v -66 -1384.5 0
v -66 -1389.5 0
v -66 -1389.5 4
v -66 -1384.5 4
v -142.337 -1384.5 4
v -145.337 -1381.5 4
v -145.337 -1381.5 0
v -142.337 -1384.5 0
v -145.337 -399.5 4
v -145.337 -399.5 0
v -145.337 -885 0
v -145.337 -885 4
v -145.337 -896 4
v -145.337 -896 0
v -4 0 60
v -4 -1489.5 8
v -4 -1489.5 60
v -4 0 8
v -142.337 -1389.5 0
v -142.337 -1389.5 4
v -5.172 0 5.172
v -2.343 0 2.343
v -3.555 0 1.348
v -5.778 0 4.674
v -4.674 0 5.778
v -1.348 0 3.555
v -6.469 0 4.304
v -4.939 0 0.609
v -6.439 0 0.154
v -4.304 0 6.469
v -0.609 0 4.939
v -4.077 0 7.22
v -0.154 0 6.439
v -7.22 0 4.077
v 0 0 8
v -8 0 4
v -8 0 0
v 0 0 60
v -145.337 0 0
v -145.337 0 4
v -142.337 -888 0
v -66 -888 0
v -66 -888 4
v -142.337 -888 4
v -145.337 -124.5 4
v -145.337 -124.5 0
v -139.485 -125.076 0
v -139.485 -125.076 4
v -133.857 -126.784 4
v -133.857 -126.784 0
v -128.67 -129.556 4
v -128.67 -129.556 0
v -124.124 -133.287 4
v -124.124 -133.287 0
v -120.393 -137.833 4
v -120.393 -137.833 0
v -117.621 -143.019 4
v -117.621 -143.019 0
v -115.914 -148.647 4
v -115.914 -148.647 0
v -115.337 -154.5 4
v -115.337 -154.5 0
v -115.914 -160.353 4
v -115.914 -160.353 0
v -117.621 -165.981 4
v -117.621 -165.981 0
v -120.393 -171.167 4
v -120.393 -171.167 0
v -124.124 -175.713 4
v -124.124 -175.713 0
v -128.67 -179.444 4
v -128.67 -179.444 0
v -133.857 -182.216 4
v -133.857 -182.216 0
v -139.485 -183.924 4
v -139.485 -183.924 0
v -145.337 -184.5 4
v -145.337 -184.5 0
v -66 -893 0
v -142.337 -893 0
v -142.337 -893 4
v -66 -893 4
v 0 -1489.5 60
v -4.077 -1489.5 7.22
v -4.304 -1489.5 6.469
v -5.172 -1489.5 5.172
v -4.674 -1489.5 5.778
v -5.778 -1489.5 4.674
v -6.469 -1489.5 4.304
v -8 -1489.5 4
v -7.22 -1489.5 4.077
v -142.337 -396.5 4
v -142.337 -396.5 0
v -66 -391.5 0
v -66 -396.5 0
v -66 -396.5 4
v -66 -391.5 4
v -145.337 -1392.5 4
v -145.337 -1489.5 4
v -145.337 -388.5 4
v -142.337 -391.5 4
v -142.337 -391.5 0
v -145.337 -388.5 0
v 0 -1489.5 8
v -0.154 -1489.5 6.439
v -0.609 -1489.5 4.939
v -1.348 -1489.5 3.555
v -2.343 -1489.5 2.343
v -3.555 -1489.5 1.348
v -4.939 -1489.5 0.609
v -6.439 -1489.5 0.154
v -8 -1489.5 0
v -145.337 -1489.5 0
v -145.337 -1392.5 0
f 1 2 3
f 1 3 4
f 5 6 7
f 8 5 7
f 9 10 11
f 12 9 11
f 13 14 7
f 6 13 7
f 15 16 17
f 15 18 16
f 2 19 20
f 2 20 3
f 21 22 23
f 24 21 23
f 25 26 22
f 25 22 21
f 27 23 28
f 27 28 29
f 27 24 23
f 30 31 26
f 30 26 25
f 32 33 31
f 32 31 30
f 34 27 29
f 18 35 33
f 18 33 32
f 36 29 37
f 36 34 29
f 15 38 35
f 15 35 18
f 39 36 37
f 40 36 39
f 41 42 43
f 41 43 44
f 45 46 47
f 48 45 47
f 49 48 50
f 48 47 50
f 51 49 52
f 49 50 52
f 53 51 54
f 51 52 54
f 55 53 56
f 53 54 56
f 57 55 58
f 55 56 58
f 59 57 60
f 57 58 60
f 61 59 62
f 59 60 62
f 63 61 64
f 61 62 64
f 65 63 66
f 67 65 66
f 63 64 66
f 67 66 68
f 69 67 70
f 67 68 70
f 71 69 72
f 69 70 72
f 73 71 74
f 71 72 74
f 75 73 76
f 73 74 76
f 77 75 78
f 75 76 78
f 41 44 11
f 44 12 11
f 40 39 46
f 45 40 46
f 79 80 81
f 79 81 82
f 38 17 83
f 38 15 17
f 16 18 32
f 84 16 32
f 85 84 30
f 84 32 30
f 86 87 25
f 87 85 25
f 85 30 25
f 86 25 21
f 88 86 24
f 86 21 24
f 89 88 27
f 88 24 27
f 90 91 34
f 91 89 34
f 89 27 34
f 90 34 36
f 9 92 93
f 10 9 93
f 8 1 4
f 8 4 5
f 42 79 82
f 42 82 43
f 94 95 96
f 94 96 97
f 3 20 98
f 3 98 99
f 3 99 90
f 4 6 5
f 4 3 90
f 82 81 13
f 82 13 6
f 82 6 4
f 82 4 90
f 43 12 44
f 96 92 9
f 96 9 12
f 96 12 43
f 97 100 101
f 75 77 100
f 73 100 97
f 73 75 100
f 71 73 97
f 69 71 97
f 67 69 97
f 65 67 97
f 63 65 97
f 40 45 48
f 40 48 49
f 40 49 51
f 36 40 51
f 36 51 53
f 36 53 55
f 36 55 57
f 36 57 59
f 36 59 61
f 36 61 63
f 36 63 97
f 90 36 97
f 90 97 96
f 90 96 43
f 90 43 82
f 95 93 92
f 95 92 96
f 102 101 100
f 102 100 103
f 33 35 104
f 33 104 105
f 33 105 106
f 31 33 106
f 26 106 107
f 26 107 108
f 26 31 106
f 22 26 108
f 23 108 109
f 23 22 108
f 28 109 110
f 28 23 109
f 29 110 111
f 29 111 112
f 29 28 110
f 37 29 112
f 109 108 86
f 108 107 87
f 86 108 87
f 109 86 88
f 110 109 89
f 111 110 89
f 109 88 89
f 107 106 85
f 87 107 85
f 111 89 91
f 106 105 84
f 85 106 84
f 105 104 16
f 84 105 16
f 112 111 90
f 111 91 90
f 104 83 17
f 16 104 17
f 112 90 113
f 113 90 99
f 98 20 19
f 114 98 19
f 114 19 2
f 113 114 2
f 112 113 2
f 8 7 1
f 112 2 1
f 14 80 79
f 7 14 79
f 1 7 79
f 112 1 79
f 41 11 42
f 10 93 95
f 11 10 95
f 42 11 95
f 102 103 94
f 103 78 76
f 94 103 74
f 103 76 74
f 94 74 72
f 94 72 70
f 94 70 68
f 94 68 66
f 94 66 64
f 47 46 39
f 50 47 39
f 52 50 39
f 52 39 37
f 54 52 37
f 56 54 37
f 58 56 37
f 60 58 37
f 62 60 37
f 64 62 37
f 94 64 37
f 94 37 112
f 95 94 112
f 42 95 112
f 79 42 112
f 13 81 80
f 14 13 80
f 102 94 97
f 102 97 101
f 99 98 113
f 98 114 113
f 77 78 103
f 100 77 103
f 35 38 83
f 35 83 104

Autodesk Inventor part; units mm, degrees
ref_plane "YZ Plane" through (0, 0, 0) normal (1, 0, 0) x (0, 1, 0)
ref_plane "XZ Plane" through (0, 0, 0) normal (0, 1, 0) x (-1, 0, 0)
ref_plane "XY Plane" through (0, 0, 0) normal (0, 0, 1) x (1, 0, 0)
sketch "Sketch1" plane through (0, 0, 0) normal (0, 0, 1) x (1, 0, 0)
  line L0 (0, 0) -> (-145.3374, 0)
  line L1 (-145.3374, 0) -> (-145.3374, -1489.5)
  line L2 (-145.3374, -1489.5) -> (0, -1489.5)
  line L3 (0, -1489.5) -> (0, 0)
  line L4 (-145.3374, -1389.5) -> (-66, -1389.5)
  line L5 (-66, -1389.5) -> (-66, -1384.5)
  line L6 (-66, -1384.5) -> (-145.3374, -1384.5)
  line L7 (-145.3374, -1384.5) -> (-145.3374, -1389.5)
  line L8 (-145.3374, -893) -> (-66, -893)
  line L9 (-66, -893) -> (-66, -888)
  line L10 (-66, -888) -> (-145.3374, -888)
  line L11 (-145.3374, -888) -> (-145.3374, -893)
  line L12 (-145.3374, -396.5) -> (-66, -396.5)
  line L13 (-66, -396.5) -> (-66, -391.5)
  line L14 (-66, -391.5) -> (-145.3374, -391.5)
  line L15 (-145.3374, -391.5) -> (-145.3374, -396.5)
  circle A0 centre (-145.3374, -154.5) radius 30
  point P0 (-145.3374, -391.5)
  point P1 (-145.3374, -1384.5)
  point P2 (-145.3374, -124.5)
  point P3 (-145.3374, -184.5)
  dimension "d0" = 1489.5
  dimension "d1" = 145.3374
  dimension "d2" = 5
  dimension "d4" = 100
  dimension "d7" = 496.5
  dimension "d23" = 66
  dimension "d28" = 60
  dimension "d29" = 1335
extrude "Plate1" add sketch "Sketch1" along normal blind 4 contours L3 L2 L1 L4 L5 L6 L8 L9 L10 L12 L13 L14 A0 L0
sketch "Sketch2" plane through (-4, 0, 0) normal (1, 0, 0) x (0, 1, 0)
  line L0 (-1489.5, 0) -> (0, 0)
  line L1 (0, 0) -> (0, 60)
  line L2 (0, 60) -> (-1489.5, 60)
  line L3 (-1489.5, 60) -> (-1489.5, 0)
edge flange "Flange1" height 60 angle 90 thickness 4 bend radius 4 thickness toward (1, 0, 0) relief tear relief width 4 relief depth 2 edges at (0, -744.75, 4) wall of the first edge with corners at (-4, -1489.5, 0) (-4, 0, 0) (-4, 0, 60) (-4, -1489.5, 60)
bend "Bend1"
corner "Corner1"
chamfer "Corner Chamfer1" distance 3 angle 45 6 edges at (-145.3374, -1389.5, 2) (-145.3374, -1384.5, 2) (-145.3374, -893, 2) (-145.3374, -888, 2) (-145.3374, -391.5, 2) (-145.3374, -396.5, 2)
equation "\"d0\" = Стрингер_длина"
equation "\"d1\" = стрингер_глубина_5"
equation "\"d2\" = паз_под_стрингер_толщина"
equation "\"d7\" = 0.333333 * Стрингер_длина"
equation "\"d23\" = паз_под_стрингер_глубина - Thickness"
equation "\"d28\" = 2 * радиус_выреза_под_сварку"
equation "\"d12\" = Thickness"
equation "\"d13\" = BendReliefWidth"
equation "\"d14\" = BendReliefDepth"
equation "\"d15\" = MinimumRemnant"
equation "\"d16\" = TransitionRadius"
equation "\"d17\" = ребро_усилителей"
equation "\"d19\" = BendRadius"
equation "\"d20\" = CornerReliefSize"
equation "\"d21\" = GapSize"
equation "\"d22\" = JacobiRadiusSize"
equation "\"BendRadius\" = Thickness"
equation "\"BendReliefWidth\" = Thickness"
equation "\"BendReliefDepth\" = 0.5 * Thickness"
equation "\"CornerReliefSize\" = 4 * Thickness"
equation "\"MinimumRemnant\" = 2 * Thickness"
equation "\"TransitionRadius\" = BendRadius"
equation "\"JacobiRadiusSize\" = BendRadius"
equation "\"GapSize\" = Thickness"
equation "\"Стрингер_длина\" = 1489.5"
equation "\"стрингер_глубина_5\" = 145.337419"
equation "\"паз_под_стрингер_толщина\" = 5"
equation "\"паз_под_стрингер_глубина\" = 70"
equation "\"Thickness\" = 4"
equation "\"радиус_выреза_под_сварку\" = 30"
equation "\"ребро_усилителей\" = 60"
properties part number "GBK 0203 stringer 5" material "Steel"
